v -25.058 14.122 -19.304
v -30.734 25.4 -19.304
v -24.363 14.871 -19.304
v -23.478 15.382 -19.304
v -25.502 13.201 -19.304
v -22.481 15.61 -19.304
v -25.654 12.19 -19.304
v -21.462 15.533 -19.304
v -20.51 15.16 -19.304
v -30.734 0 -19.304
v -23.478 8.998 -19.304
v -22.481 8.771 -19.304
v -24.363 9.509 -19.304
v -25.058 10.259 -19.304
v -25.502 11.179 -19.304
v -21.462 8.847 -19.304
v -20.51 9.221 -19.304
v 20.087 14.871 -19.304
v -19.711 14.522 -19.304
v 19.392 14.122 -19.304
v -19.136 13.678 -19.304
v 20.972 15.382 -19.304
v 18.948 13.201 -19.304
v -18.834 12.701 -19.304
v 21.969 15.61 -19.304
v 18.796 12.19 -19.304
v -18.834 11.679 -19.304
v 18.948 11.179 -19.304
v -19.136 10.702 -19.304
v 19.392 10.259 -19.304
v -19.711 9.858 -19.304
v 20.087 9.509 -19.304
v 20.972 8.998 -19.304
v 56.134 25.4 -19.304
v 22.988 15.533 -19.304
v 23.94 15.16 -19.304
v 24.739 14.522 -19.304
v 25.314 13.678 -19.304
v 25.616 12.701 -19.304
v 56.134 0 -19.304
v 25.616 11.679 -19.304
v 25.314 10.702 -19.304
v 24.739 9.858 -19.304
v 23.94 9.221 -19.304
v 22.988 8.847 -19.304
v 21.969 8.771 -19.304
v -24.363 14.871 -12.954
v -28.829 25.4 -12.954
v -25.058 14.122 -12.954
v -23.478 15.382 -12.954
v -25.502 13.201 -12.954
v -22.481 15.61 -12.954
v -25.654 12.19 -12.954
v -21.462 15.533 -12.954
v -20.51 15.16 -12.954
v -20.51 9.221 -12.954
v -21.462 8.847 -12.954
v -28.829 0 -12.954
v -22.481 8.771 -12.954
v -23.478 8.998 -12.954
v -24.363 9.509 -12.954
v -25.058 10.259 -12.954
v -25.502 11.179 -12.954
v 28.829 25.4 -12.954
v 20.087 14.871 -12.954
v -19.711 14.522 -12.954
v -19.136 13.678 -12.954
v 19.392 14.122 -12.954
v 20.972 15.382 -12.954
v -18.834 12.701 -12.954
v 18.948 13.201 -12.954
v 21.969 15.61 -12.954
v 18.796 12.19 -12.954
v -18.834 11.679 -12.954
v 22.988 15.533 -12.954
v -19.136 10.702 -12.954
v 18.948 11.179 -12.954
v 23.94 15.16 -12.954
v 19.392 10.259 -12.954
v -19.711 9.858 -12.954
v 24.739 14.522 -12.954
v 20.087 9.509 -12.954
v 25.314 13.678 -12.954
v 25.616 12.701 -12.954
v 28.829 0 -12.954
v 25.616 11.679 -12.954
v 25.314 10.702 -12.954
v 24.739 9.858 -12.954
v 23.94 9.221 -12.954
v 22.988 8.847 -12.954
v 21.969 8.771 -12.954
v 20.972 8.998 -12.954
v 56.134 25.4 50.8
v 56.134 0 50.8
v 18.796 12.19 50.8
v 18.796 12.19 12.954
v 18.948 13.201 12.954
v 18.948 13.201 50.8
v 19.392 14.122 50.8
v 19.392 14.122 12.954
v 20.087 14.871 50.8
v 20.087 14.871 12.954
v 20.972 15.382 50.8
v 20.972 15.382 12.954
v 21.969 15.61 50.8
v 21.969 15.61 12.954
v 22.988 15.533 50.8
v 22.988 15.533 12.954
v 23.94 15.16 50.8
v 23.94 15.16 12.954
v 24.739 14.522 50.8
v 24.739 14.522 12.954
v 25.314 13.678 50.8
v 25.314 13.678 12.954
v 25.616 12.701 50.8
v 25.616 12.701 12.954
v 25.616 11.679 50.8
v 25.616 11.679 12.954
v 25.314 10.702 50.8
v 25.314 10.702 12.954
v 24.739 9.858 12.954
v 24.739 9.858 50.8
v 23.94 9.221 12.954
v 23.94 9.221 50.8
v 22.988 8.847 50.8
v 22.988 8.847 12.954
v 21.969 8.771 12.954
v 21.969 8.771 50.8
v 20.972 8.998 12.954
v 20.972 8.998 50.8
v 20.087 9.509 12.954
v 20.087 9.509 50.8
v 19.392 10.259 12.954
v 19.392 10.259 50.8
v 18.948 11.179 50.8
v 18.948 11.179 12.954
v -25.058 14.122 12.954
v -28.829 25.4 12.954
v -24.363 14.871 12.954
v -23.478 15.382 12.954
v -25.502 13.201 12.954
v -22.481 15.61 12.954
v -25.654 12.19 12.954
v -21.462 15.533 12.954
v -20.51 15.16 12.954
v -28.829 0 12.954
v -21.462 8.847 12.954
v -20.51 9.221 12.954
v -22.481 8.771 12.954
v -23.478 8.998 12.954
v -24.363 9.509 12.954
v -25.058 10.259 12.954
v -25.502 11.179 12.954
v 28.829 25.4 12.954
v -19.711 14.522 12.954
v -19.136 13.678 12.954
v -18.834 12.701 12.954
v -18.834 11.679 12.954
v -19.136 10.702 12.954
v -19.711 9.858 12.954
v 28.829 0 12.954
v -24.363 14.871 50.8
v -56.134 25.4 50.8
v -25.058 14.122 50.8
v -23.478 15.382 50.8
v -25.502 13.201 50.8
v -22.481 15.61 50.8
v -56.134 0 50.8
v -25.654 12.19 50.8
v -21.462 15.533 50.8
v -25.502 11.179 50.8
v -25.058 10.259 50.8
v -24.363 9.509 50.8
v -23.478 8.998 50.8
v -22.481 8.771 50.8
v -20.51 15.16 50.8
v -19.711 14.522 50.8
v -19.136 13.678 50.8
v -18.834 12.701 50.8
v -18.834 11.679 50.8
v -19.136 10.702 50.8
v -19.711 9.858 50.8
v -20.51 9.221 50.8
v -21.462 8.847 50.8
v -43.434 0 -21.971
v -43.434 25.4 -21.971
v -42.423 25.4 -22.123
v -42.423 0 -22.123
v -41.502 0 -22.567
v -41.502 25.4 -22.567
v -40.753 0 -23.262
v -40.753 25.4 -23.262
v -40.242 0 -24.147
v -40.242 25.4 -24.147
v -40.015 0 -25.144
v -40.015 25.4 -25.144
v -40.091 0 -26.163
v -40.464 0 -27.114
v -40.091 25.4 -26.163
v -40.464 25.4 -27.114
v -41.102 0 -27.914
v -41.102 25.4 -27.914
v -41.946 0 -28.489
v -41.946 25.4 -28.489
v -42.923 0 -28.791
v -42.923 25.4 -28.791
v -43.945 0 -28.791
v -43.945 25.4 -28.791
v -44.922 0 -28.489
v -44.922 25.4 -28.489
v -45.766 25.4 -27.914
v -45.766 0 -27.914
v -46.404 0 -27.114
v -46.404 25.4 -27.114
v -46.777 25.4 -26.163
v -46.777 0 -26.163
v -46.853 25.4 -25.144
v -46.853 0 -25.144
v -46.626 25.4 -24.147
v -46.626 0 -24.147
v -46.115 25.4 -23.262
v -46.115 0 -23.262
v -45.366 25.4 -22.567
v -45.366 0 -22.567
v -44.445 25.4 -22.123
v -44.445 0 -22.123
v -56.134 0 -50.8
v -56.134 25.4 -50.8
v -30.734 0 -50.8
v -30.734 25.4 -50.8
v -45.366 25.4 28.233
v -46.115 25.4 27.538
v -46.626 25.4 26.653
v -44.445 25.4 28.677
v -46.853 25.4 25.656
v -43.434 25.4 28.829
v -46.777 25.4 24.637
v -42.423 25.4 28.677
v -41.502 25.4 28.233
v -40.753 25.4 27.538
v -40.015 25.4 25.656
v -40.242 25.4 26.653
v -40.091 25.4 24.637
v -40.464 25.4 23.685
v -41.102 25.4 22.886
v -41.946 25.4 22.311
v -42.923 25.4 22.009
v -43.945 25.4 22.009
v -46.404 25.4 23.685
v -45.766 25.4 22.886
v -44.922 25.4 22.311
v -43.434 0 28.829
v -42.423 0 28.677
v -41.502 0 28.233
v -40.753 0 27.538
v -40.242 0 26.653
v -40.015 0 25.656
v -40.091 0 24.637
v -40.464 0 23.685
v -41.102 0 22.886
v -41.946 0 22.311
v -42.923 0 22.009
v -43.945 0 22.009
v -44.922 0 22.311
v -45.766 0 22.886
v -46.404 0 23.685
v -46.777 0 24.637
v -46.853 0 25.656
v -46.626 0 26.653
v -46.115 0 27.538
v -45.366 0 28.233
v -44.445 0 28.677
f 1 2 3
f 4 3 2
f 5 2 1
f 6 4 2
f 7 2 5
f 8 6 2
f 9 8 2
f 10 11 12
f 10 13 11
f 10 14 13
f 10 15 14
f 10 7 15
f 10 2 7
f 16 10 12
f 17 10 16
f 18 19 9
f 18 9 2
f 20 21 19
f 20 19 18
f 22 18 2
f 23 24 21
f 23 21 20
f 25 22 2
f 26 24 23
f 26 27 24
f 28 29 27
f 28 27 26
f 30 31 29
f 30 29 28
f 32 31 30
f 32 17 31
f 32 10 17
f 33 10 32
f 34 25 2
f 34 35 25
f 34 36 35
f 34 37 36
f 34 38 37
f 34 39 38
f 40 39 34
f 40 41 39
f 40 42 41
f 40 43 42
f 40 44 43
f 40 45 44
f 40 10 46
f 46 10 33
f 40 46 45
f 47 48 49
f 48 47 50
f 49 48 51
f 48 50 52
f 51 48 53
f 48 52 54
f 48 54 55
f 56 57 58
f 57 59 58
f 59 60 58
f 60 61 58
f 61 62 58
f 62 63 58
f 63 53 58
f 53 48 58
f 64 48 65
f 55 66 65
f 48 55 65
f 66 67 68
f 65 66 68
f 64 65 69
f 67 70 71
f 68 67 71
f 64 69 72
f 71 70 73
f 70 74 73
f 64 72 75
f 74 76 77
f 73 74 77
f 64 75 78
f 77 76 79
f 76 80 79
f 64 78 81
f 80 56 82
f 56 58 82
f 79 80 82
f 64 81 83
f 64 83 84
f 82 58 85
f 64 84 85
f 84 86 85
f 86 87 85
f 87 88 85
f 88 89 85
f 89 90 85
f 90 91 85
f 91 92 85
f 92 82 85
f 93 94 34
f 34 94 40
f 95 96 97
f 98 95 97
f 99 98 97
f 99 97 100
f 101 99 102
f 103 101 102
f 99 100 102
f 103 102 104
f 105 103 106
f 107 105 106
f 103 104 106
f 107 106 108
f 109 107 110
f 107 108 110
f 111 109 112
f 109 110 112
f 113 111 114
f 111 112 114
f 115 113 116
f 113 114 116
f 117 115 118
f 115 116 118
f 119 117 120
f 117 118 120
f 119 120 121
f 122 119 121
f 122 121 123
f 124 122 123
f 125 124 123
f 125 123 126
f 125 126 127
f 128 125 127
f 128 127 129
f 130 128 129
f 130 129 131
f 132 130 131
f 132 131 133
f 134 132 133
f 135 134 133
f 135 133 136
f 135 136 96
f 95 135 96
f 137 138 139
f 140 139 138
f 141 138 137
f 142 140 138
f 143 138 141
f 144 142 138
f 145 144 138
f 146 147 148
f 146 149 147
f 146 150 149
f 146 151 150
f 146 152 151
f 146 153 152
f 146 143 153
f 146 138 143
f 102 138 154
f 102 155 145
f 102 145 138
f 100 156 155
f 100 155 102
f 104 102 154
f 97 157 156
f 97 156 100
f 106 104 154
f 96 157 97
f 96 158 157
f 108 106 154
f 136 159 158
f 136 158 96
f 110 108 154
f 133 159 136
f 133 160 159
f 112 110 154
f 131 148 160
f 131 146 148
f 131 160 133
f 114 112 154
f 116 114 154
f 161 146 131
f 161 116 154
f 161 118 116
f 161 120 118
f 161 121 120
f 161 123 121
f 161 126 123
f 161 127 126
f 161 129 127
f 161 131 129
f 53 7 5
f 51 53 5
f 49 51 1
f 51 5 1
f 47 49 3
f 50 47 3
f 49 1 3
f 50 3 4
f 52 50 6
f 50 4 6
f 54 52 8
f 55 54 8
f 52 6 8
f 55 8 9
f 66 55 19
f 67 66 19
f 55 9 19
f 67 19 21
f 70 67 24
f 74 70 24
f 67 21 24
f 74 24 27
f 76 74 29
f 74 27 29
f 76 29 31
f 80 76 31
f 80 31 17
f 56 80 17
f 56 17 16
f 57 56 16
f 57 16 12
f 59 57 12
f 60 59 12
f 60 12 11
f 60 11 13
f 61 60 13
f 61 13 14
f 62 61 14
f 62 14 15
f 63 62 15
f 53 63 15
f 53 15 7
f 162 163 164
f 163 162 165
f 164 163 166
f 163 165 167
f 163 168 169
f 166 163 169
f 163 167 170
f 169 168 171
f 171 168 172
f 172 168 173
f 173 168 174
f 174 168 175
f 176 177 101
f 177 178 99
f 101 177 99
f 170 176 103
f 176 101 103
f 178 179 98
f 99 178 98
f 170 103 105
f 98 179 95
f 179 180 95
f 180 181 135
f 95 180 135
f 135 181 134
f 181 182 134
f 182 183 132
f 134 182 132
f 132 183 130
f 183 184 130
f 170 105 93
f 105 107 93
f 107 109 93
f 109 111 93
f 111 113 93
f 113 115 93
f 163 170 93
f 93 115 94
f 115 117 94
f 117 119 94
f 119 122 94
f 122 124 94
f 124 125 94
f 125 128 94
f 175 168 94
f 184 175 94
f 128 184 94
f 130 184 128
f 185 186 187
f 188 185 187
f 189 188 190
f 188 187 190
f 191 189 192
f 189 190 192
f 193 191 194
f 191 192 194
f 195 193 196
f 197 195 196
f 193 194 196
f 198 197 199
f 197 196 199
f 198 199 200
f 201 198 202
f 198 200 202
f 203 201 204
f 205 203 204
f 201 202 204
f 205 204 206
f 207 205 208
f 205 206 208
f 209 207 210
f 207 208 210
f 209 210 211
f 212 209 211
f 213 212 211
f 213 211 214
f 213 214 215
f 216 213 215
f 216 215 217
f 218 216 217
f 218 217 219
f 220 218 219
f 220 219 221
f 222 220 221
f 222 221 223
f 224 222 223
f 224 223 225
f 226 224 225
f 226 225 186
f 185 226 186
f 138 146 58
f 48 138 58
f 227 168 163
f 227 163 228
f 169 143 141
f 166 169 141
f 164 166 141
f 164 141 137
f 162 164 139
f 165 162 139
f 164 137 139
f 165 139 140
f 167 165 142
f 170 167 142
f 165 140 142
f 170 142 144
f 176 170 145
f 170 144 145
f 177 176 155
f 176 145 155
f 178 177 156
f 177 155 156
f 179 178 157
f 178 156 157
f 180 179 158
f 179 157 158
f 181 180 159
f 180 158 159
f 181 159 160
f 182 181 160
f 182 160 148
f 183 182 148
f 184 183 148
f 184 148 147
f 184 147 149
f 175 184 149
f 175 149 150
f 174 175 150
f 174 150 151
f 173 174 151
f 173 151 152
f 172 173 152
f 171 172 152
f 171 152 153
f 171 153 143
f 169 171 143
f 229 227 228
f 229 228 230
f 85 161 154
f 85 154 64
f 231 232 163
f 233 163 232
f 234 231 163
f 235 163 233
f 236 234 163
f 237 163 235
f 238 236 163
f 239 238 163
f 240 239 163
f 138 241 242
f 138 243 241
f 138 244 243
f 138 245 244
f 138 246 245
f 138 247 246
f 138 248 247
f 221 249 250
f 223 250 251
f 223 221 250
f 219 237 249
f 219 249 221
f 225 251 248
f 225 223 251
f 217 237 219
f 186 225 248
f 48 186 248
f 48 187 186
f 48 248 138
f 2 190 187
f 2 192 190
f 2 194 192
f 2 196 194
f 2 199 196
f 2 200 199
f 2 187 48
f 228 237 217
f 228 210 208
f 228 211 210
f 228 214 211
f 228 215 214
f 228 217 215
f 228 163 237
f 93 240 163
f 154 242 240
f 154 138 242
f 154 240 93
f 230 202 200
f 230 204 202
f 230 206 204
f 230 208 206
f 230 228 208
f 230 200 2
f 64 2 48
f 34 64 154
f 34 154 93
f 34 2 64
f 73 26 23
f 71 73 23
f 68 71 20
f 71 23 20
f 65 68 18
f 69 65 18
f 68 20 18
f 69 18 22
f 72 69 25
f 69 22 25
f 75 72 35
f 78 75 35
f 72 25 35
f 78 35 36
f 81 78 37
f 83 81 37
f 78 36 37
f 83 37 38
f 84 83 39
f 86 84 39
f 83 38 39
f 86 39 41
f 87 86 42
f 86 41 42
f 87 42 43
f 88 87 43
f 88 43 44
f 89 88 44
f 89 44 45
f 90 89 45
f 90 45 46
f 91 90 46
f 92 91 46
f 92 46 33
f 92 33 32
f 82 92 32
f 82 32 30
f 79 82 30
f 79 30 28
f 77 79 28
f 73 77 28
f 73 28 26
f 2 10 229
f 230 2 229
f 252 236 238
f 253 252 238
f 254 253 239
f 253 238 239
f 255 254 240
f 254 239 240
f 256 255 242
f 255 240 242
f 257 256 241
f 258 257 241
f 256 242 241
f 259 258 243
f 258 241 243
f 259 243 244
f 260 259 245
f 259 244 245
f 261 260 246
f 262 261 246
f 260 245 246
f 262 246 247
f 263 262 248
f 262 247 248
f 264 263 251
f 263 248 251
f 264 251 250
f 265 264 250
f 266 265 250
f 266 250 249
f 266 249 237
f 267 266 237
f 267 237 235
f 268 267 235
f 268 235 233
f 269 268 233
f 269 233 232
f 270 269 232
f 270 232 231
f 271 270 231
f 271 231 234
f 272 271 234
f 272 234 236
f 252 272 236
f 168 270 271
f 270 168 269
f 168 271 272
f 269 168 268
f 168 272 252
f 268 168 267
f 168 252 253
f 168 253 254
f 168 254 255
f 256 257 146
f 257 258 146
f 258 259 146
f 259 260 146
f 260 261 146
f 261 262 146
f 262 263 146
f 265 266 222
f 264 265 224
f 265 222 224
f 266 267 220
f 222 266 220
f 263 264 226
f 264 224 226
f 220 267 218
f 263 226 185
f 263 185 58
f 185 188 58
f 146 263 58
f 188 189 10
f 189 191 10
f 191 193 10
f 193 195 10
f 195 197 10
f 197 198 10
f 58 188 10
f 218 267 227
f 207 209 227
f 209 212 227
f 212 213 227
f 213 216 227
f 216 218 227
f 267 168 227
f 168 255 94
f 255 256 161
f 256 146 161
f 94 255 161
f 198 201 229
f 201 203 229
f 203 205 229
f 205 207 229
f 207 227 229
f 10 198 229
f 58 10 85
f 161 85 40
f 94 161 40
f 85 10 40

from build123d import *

# Parameters (mm, degrees)
SKETCH1_W           = 112.268
SKETCH1_H           = 101.6
SKETCH1_W_2         = 57.658
SKETCH1_H_2         = 25.908
BOSS_EXTRUDE1_DEPTH = 25.4
SKETCH2_W           = 86.868
SKETCH2_H           = 31.496
CUT_EXTRUDE1_DEPTH  = 80.855030875
SKETCH4_R           = 3.429
CUT_EXTRUDE2_DEPTH  = 94.331435069
SKETCH5_R           = 3.429
CUT_EXTRUDE3_DEPTH  = 80.855030875


with BuildPart() as part:
    # Sketch1 → Boss-Extrude1 (new body)
    with BuildSketch(Plane(origin=(0, 0, 0), x_dir=(1, 0, 0), z_dir=(0, 1, 0))):
        Rectangle(SKETCH1_W, SKETCH1_H)
        Rectangle(SKETCH1_W_2, SKETCH1_H_2, mode=Mode.SUBTRACT)
    extrude(amount=BOSS_EXTRUDE1_DEPTH)

    # Sketch2 → Cut-Extrude1 (cut, through all)
    with BuildSketch(Plane(origin=(0, 0, 0), x_dir=(1, 0, 0), z_dir=(0, 1, 0))):
        with Locations((12.7, 35.052)):
            Rectangle(SKETCH2_W, SKETCH2_H)
    extrude(amount=CUT_EXTRUDE1_DEPTH, mode=Mode.SUBTRACT)

    # Sketch4 → Cut-Extrude2 (cut, through all)
    with BuildSketch(Plane(origin=(0, 0, -19.304), x_dir=(-1, 0, 0), z_dir=(0, 0, -1))):
        with Locations((-22.225, 12.190161911)):
            Circle(SKETCH4_R)
        with Locations((22.225, 12.190161911)):
            Circle(SKETCH4_R)
    extrude(amount=-CUT_EXTRUDE2_DEPTH, mode=Mode.SUBTRACT)

    # Sketch5 → Cut-Extrude3 (cut, through all)
    with BuildSketch(Plane(origin=(0, 25.4, 0), x_dir=(1, 0, 0), z_dir=(0, 1, 0))):
        with Locations(Location((-43.434, 25.4, 0), (0, 0, 270))):
            Circle(SKETCH5_R)
        with Locations(Location((-43.434, -25.4, 0), (0, 0, 270))):
            Circle(SKETCH5_R)
    extrude(amount=-CUT_EXTRUDE3_DEPTH, mode=Mode.SUBTRACT)


solid = part.part
